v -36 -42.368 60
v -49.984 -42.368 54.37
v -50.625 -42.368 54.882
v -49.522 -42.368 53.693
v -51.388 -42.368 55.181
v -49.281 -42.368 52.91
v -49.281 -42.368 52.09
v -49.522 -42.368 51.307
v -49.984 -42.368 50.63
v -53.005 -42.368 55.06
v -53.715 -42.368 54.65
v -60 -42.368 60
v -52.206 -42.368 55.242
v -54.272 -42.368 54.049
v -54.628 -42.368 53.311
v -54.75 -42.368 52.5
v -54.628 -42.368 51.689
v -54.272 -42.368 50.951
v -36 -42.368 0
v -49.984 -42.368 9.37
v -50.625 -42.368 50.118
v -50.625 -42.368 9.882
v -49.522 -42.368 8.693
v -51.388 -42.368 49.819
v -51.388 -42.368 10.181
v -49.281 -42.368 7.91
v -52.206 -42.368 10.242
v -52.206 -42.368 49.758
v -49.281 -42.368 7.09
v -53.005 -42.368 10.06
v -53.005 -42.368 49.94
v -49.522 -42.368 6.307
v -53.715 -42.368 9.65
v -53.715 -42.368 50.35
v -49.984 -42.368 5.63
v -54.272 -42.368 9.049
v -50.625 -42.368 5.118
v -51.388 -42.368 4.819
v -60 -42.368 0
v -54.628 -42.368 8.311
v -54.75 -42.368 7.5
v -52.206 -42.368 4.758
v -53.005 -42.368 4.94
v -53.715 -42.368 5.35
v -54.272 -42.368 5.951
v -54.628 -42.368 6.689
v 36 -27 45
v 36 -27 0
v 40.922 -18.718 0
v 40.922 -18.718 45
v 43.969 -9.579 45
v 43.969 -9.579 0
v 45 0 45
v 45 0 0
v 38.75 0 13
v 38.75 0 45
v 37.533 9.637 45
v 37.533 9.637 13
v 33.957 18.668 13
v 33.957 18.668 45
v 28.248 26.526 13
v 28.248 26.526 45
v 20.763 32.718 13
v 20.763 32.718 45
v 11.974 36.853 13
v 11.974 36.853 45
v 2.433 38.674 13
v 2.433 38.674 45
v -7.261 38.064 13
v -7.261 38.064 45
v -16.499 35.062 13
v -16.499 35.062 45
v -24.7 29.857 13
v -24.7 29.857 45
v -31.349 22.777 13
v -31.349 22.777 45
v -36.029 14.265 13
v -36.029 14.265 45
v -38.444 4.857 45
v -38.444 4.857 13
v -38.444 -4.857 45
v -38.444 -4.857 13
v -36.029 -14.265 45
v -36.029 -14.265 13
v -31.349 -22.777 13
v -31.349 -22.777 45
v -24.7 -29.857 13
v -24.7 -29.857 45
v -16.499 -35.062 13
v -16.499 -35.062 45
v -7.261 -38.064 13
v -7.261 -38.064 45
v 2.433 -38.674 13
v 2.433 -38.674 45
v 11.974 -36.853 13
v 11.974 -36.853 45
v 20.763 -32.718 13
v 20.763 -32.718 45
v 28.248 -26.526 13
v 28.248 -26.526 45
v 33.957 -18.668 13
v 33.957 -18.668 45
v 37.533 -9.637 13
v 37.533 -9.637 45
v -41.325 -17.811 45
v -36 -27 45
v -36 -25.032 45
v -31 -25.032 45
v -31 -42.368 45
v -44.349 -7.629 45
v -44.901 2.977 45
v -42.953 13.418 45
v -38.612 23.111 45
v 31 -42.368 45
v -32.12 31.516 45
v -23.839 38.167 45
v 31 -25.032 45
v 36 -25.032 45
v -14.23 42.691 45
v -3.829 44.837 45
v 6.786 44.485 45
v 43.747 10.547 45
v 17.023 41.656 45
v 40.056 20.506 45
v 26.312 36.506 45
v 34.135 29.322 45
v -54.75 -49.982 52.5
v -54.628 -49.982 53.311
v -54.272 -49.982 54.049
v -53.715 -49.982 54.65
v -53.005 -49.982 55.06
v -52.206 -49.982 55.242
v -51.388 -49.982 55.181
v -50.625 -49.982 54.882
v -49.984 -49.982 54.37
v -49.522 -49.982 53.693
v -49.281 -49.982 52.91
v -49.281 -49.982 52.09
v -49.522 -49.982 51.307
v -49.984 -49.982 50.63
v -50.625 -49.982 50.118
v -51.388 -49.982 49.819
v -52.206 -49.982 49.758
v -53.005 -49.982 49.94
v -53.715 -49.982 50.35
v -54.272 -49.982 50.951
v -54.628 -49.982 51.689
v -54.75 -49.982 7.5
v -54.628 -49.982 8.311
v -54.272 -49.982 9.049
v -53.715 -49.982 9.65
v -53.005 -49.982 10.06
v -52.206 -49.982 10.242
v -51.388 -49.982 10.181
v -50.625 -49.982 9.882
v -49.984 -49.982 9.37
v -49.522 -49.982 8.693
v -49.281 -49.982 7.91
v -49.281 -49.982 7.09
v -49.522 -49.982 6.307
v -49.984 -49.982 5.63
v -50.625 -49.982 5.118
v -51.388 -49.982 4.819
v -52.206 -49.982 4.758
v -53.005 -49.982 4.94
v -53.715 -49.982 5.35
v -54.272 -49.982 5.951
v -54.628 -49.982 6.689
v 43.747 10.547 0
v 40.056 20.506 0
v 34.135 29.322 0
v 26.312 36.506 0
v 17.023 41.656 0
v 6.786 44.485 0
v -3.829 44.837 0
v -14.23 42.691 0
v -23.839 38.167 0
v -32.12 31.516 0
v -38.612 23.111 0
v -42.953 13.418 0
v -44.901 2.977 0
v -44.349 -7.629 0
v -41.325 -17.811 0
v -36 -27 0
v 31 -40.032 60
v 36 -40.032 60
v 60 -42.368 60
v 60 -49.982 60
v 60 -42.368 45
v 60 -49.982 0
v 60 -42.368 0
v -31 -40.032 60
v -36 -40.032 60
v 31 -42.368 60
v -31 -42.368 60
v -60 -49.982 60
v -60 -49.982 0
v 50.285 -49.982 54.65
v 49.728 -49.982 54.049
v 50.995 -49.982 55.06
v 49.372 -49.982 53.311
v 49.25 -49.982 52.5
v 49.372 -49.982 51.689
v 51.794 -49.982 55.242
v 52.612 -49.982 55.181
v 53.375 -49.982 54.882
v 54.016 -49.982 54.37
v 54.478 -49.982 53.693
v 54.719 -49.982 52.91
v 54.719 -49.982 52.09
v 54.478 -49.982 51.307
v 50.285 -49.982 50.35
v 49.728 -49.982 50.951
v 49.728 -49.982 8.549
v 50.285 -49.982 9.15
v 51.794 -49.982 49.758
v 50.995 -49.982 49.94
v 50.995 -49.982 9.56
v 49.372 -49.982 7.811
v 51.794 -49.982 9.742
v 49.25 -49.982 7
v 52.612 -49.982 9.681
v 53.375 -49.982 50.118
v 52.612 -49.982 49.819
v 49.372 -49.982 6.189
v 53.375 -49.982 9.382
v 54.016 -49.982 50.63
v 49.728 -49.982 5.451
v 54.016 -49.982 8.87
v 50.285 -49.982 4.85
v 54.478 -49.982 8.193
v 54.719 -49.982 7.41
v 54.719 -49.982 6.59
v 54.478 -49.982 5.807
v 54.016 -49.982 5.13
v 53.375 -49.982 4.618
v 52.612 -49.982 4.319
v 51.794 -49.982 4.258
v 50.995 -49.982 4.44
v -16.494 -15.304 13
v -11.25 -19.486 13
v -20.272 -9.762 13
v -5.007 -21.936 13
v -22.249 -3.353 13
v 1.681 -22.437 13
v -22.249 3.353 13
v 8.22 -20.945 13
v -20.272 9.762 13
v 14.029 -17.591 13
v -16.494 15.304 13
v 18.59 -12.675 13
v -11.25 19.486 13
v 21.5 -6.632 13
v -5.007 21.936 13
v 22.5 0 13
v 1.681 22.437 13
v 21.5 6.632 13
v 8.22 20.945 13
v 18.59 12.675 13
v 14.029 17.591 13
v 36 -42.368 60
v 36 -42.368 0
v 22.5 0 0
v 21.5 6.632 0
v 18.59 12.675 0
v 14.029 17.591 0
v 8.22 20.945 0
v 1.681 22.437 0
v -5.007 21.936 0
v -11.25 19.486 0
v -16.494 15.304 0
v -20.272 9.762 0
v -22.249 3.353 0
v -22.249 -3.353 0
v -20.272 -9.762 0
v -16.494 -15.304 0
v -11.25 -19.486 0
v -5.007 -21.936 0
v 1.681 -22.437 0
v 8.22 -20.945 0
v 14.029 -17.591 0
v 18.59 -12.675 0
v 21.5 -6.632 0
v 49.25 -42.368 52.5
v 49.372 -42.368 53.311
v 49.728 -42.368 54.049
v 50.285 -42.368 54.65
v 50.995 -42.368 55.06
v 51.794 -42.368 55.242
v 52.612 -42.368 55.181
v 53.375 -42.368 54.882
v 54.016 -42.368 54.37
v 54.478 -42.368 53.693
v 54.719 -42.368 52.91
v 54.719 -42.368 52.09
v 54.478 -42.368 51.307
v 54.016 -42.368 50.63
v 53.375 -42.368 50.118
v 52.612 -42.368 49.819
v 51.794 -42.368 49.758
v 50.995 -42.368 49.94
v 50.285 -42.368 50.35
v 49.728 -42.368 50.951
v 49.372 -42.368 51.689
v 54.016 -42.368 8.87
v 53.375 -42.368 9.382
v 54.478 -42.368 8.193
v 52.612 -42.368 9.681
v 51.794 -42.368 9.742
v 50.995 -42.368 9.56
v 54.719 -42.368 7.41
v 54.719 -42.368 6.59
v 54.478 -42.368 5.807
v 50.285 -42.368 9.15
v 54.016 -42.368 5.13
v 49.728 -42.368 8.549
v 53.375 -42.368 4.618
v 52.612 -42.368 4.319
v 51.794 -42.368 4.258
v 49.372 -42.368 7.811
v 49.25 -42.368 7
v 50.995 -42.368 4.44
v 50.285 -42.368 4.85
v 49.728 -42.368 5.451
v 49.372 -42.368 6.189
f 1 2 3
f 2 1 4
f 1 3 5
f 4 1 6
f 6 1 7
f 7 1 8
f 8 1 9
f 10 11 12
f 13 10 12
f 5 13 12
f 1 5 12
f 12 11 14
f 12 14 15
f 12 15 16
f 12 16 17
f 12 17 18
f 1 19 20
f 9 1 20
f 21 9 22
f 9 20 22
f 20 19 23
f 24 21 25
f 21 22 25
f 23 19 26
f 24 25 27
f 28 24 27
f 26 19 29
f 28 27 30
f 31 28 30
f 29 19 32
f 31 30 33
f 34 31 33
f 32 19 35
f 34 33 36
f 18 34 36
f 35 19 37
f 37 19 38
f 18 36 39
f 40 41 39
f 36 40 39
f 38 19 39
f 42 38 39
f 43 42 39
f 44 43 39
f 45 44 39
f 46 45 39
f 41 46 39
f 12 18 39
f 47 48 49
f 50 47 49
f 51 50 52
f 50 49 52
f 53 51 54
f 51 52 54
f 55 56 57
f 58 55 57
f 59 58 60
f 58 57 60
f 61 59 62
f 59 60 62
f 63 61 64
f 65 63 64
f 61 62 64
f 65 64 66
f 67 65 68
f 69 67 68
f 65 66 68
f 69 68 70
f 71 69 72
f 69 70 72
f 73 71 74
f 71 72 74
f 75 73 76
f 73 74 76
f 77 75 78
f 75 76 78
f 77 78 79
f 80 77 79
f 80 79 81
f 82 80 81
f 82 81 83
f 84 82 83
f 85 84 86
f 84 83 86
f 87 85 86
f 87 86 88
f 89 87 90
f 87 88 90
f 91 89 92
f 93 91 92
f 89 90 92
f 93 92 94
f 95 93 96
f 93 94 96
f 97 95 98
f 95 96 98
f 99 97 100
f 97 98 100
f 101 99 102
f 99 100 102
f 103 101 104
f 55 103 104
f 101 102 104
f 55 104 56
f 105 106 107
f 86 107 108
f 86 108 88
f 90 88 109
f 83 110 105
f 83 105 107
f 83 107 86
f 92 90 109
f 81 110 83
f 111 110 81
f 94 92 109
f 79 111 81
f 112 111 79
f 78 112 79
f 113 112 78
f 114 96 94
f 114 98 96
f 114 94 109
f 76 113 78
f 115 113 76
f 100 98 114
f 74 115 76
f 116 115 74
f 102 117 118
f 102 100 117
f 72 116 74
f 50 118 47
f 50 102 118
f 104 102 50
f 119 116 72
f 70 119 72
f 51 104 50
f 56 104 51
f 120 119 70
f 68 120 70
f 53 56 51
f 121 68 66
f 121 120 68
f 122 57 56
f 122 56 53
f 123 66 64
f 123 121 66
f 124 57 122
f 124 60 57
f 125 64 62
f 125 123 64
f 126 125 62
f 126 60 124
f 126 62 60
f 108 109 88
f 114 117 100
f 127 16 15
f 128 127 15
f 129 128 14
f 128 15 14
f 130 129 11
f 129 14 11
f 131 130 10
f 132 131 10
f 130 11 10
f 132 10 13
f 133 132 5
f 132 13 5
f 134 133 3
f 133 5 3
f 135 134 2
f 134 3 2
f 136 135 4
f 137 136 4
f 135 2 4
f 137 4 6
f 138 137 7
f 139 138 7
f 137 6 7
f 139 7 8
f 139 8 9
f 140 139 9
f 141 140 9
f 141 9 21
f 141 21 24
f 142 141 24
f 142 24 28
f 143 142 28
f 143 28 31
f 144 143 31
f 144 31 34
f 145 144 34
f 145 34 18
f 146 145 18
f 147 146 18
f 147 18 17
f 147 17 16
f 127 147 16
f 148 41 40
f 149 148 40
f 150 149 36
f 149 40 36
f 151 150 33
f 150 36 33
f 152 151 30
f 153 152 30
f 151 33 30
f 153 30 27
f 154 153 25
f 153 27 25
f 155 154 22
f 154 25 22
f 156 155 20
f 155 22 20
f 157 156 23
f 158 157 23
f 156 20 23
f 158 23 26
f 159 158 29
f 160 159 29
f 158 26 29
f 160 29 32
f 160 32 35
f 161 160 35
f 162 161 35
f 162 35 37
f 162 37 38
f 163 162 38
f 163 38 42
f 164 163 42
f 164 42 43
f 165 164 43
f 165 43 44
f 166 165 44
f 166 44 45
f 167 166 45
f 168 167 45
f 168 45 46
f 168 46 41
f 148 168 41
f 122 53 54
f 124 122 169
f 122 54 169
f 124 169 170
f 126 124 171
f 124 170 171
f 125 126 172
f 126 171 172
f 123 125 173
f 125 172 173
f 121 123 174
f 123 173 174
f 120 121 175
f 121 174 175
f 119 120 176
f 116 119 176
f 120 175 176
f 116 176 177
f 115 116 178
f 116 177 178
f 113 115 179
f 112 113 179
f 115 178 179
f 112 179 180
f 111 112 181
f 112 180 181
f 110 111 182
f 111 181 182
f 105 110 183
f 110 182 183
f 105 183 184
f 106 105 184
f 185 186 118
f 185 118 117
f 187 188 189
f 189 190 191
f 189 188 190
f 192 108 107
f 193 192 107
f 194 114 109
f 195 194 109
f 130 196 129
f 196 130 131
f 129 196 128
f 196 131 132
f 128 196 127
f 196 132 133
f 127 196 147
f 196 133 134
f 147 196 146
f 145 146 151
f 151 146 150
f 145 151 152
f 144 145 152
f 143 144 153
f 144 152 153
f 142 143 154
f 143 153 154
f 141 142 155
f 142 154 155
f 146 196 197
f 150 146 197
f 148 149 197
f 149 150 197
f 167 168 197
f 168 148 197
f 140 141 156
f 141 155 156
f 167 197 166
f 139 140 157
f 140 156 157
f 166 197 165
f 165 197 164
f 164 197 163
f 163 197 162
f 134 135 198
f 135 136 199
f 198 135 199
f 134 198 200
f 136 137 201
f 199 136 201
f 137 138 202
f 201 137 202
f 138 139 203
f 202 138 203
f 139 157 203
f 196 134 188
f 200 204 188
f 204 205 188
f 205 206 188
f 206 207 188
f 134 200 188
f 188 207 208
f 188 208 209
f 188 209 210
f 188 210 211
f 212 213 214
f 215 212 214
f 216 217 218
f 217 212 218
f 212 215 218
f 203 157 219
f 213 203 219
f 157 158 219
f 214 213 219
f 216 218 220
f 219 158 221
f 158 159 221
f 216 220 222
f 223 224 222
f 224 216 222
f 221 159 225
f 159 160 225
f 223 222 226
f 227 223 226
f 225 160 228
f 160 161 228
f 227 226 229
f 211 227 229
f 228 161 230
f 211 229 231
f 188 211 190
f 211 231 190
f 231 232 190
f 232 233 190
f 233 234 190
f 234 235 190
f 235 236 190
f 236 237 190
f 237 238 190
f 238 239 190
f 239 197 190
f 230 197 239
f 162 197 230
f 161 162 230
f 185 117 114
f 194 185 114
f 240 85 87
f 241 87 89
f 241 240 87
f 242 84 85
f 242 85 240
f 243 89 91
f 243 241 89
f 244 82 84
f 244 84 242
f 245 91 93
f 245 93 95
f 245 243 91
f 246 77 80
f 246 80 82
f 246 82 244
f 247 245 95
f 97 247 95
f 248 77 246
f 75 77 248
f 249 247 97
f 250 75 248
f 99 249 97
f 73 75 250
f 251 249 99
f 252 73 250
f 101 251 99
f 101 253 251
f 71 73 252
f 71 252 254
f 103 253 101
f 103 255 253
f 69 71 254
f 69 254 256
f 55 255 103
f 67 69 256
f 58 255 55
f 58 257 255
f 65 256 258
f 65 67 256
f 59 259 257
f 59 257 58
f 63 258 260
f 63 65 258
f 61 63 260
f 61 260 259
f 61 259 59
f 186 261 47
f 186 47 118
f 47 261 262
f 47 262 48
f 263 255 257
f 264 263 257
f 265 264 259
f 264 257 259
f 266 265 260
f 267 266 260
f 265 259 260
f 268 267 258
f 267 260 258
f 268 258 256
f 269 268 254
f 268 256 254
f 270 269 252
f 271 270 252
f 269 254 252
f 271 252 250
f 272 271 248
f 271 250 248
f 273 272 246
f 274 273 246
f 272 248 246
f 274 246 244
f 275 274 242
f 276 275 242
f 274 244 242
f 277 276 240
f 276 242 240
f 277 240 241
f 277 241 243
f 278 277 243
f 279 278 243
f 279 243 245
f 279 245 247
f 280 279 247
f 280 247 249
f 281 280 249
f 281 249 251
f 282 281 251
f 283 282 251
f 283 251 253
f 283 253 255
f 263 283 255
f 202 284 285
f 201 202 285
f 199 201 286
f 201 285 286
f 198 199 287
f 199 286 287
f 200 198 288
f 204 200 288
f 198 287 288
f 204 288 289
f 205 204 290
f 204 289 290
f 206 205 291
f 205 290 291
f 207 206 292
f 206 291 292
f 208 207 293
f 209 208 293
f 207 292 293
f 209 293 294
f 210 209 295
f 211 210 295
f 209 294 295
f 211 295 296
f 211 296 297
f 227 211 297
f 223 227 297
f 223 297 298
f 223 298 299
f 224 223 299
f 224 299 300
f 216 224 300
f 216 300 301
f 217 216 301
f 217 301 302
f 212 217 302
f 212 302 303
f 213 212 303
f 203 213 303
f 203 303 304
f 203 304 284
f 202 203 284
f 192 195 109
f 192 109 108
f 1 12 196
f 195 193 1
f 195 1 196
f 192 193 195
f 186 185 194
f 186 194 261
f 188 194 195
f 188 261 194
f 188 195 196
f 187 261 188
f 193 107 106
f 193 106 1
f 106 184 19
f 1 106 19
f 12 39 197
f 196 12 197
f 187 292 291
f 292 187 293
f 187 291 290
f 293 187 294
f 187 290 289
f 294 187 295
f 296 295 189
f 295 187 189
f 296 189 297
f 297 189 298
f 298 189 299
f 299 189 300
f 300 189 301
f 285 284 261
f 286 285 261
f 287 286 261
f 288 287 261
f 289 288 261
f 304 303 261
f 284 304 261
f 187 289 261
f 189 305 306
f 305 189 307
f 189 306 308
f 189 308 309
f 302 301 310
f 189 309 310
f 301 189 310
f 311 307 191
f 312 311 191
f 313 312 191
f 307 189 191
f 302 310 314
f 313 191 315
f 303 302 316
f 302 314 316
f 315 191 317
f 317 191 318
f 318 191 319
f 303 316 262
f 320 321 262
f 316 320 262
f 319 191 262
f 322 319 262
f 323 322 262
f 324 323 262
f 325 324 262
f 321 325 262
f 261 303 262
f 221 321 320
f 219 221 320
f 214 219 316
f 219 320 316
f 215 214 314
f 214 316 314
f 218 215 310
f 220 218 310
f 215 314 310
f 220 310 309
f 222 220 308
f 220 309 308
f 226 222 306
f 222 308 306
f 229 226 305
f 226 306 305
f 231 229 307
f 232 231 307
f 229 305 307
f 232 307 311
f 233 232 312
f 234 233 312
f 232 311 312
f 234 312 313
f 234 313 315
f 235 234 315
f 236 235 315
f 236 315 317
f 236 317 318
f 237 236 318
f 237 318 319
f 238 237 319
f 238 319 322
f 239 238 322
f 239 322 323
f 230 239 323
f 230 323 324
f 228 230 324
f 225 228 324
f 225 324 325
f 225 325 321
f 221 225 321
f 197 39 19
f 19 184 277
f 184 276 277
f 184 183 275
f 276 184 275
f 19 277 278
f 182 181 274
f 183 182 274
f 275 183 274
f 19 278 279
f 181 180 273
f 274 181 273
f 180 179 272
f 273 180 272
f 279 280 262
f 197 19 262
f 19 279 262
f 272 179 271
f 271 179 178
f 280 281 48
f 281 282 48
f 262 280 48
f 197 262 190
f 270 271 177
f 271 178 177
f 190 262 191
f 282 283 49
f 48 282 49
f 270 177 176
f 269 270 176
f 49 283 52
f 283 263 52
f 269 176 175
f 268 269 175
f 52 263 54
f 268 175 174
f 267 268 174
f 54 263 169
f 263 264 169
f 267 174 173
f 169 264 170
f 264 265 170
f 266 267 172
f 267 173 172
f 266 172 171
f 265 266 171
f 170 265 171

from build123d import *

# Parameters (mm, degrees)
F0_W      = 24
F0_H      = 7.6146386564
F1_DEPTH  = 45
F2_R      = 38.75
F4_DEPTH  = 32
F5_DEPTH  = 15
F7_DEPTH  = 15
F8_SIZE   = 14.99999
F9_R      = 2.75
F10_DEPTH = 25
F11_R     = 22.5
F12_DEPTH = 25


# Not quite as in the source:
# - a fillet or chamfer is up to 0.001 mm smaller than in the source, because OpenCascade refuses the exact size


with BuildPart() as f1:
    # F0 (on Top) → F1 (new body)
    with BuildSketch(Plane.XY):
        with BuildLine():
            ThreePointArc((36, -27), (42.6907484123, -14.2302494708), (45, 0))
            ThreePointArc((45, 0), (-14.2302494708, 42.6907484123), (-36, -27))
            Line((-36, -27), (36, -27))
        make_face()
        with BuildLine():
            ThreePointArc((-15.1652218257, -42.3676297069), (-26.7116265289, -36.2144861648), (-36, -27))
            Line((-36, -27), (-36, -42.3676297069))
            Line((-36, -42.3676297069), (-15.1652218257, -42.3676297069))
        make_face()
        with BuildLine():
            Line((36, -27), (-36, -27))
            ThreePointArc((-36, -27), (-26.7116265289, -36.2144861648), (-15.1652218257, -42.3676297069))
            Line((-15.1652218257, -42.3676297069), (15.1652218257, -42.3676297069))
            ThreePointArc((15.1652218257, -42.3676297069), (26.7116265289, -36.2144861648), (36, -27))
        make_face()
        with BuildLine():
            Line((15.1652218257, -42.3676297069), (-15.1652218257, -42.3676297069))
            ThreePointArc((-15.1652218257, -42.3676297069), (0, -45), (15.1652218257, -42.3676297069))
        make_face()
        with Locations((-48, -46.174949035)):
            Rectangle(F0_W, F0_H)
        with BuildLine():
            ThreePointArc((15.1652218257, -42.3676297069), (0, -45), (-15.1652218257, -42.3676297069))
            Line((-15.1652218257, -42.3676297069), (-36, -42.3676297069))
            Line((-36, -42.3676297069), (-36, -49.9822683632))
            Line((-36, -49.9822683632), (36, -49.9822683632))
            Line((36, -49.9822683632), (36, -42.3676297069))
            Line((36, -42.3676297069), (15.1652218257, -42.3676297069))
        make_face()
        with Locations((48, -46.174949035)):
            Rectangle(F0_W, F0_H)
        with BuildLine():
            Line((36, -42.3676297069), (36, -27))
            ThreePointArc((36, -27), (26.7116265289, -36.2144861648), (15.1652218257, -42.3676297069))
            Line((15.1652218257, -42.3676297069), (36, -42.3676297069))
        make_face()
    extrude(amount=F1_DEPTH)

    # F2 (on face) → F4 (cut)
    with BuildSketch(Plane.XY.offset(45)):
        Circle(F2_R)
    extrude(amount=-F4_DEPTH, mode=Mode.SUBTRACT)

    # F3 (on face) → F5 (join)
    with BuildSketch(Plane.XY.offset(45)):
        Polygon((-36, -42.3676297069), (-60, -42.3676297069), (-60, -49.9822683632), (60, -49.9822683632), (60, -42.3676297069), (36, -42.3676297069), align=None)
    extrude(amount=F5_DEPTH)

    # F6 (on face) → F7 (join)
    with BuildSketch(Plane.XY.offset(45)):
        Polygon((-31, -25.031657964), (-36, -25.031657964), (-36, -27), (-36, -42.3676297069), (-31, -42.3676297069), align=None)
        Polygon((36, -42.3676297069), (36, -27), (36, -25.031657964), (31, -25.031657964), (31, -42.3676297069), align=None)
    extrude(amount=F7_DEPTH)

    # F8 (size 15 in the source; OpenCascade refuses exactly that, so slightly less here)
    f8_edges = [f1.edges().sort_by_distance(p)[0] for p in [
        (-33.5, -25.031658, 60),
        (33.5, -25.031658, 60),
    ]]
    chamfer(f8_edges, length=F8_SIZE)

    # F9 (on face) → F10 (cut)
    with BuildSketch(Plane(origin=(0, -42.3676297069, 0), x_dir=(-1, 0, 0), z_dir=(0, 1, 0))):
        with Locations((52, 7.5)):
            Circle(F9_R)
        with Locations((52, 52.5)):
            Circle(F9_R)
        with Locations((-52, 7)):
            Circle(F9_R)
        with Locations((-52, 52.5)):
            Circle(F9_R)
    extrude(amount=-F10_DEPTH, mode=Mode.SUBTRACT)

    # F11 (on face) → F12 (cut)
    with BuildSketch(Plane.XY.offset(13)):
        Circle(F11_R)
    extrude(amount=-F12_DEPTH, mode=Mode.SUBTRACT)


solid = f1.part
